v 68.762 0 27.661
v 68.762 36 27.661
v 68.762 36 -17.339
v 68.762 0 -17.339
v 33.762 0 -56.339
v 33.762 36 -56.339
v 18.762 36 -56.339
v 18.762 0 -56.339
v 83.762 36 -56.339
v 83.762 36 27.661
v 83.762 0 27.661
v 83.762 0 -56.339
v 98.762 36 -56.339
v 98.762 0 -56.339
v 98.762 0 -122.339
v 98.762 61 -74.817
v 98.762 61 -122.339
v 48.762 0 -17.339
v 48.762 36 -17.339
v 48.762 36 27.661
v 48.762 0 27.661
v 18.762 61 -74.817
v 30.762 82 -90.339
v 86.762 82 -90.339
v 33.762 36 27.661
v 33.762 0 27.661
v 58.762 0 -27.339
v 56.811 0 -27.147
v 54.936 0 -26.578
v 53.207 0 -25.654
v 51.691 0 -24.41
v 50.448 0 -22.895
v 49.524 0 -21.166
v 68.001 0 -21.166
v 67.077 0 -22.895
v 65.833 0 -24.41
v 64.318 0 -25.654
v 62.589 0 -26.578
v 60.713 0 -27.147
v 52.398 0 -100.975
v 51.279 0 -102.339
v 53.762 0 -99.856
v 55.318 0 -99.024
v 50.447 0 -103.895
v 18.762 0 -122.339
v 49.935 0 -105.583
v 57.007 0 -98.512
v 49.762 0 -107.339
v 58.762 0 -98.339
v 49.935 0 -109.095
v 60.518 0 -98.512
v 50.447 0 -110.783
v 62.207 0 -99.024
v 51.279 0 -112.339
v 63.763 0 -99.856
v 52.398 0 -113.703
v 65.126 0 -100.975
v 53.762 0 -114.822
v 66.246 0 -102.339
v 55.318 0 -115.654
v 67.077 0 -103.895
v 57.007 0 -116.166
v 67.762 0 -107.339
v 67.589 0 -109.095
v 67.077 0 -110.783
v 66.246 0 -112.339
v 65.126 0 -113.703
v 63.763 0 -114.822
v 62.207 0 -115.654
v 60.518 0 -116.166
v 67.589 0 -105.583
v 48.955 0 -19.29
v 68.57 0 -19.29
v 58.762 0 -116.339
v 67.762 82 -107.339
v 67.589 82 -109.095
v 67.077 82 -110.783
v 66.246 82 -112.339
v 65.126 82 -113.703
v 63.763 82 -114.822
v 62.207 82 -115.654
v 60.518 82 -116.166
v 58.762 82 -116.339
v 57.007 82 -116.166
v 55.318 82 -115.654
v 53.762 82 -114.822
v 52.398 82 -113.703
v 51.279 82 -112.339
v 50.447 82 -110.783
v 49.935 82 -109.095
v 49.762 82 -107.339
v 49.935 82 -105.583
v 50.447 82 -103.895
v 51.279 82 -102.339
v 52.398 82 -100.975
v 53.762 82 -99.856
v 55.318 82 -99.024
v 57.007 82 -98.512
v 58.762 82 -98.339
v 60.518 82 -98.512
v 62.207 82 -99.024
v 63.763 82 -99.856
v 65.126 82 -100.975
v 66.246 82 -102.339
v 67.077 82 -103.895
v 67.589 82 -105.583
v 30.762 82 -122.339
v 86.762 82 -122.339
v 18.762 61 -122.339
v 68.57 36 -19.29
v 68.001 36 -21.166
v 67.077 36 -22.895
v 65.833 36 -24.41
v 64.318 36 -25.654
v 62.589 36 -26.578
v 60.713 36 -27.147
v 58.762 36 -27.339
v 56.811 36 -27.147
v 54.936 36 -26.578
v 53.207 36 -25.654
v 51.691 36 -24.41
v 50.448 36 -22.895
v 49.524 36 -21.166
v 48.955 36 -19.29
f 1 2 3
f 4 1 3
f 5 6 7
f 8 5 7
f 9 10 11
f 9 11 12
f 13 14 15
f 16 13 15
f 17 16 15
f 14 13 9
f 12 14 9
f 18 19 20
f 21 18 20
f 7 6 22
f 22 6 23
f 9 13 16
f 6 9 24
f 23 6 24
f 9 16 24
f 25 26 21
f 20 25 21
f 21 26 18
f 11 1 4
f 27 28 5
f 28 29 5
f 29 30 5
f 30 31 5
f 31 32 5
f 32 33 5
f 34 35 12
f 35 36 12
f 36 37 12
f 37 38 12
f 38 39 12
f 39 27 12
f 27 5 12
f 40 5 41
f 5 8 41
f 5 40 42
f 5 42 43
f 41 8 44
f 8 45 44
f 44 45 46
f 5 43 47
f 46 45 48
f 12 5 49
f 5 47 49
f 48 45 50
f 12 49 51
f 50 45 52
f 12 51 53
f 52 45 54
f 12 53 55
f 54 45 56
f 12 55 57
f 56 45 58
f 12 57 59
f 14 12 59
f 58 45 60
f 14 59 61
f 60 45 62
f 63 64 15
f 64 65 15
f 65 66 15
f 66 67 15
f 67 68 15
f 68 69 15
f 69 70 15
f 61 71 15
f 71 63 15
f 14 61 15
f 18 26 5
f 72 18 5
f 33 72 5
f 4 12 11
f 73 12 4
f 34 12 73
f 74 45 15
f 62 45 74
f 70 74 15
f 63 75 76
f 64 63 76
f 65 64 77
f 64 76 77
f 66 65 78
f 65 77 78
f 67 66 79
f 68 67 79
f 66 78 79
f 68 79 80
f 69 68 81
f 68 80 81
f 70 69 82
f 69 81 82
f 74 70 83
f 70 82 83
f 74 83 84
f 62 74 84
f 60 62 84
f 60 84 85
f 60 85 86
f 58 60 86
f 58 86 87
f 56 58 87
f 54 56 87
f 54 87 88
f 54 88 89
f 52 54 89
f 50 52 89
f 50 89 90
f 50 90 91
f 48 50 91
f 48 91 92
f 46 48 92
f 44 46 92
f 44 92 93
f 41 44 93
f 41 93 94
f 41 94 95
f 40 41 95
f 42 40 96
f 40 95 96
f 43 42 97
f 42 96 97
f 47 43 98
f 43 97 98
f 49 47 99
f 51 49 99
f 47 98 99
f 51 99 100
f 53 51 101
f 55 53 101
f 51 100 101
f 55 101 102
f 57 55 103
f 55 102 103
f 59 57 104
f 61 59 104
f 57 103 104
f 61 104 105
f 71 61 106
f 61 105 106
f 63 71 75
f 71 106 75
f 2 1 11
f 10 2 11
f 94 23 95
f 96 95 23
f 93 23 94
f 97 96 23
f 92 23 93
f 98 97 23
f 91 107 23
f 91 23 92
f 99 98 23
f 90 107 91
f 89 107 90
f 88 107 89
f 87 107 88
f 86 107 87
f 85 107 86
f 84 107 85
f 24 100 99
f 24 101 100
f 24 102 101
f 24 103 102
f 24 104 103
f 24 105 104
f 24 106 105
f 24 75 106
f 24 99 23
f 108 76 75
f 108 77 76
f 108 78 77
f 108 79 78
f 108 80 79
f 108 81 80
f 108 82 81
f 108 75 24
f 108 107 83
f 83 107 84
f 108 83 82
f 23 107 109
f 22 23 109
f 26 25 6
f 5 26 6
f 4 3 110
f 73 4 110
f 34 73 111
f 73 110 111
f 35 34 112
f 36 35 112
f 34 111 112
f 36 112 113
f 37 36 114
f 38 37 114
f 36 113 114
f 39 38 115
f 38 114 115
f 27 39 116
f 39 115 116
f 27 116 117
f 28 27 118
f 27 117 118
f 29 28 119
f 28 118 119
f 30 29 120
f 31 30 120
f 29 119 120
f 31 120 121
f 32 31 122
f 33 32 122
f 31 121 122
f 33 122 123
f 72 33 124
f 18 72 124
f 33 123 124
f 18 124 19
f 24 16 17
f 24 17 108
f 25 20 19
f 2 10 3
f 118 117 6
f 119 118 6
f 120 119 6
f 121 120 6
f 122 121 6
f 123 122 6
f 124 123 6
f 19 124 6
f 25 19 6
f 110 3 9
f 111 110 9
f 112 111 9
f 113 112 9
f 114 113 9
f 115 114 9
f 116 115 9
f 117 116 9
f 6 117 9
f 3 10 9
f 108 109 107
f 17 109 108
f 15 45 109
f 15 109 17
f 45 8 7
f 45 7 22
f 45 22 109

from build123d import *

# Parameters (mm, degrees)
CROQUIS1_W              = 80
CROQUIS1_H              = 150
SALIENTE_EXTRUIR1_DEPTH = 82
CORTAR_EXTRUIR1_DEPTH   = 150
CROQUIS3_R              = 9
CROQUIS3_W              = 12
CROQUIS3_H              = 84
CROQUIS3_W_2            = 3
CORTAR_EXTRUIR2_DEPTH   = 150
CORTAR_EXTRUIR3_DEPTH   = 80


with BuildPart() as part:
    # Croquis1 → Saliente-Extruir1 (new body)
    with BuildSketch(Plane(origin=(0, 0, 0), x_dir=(1, 0, 0), z_dir=(0, 1, 0))):
        with Locations((58.762376238, 47.339108911)):
            Rectangle(CROQUIS1_W, CROQUIS1_H)
    extrude(amount=SALIENTE_EXTRUIR1_DEPTH)

    # Croquis2 → Cortar-Extruir1 (cut)
    with BuildSketch(Plane(origin=(0, 0, -122.339108911), x_dir=(-1, 0, 0), z_dir=(0, 0, -1))):
        Polygon((-98.762376238, 82), (-98.762376238, 61), (-86.762376238, 82), align=None)
        Polygon((-18.762376238, 82), (-30.762376238, 82), (-18.762376238, 61), align=None)
    extrude(amount=-CORTAR_EXTRUIR1_DEPTH, mode=Mode.SUBTRACT)

    # Croquis3 → Cortar-Extruir2 (cut)
    with BuildSketch(Plane(origin=(0, 82, 0), x_dir=(1, 0, 0), z_dir=(0, 1, 0))):
        with Locations((58.762376238, 107.339108911)):
            Circle(CROQUIS3_R)
        with BuildLine():
            ThreePointArc((68.762376238, 17.339108911), (58.762376238, 27.339108911), (48.762376238, 17.339108911))
            Line((48.762376238, 17.339108911), (48.762376238, -27.660891089))
            Line((48.762376238, -27.660891089), (68.762376238, -27.660891089))
            Line((68.762376238, -27.660891089), (68.762376238, 17.339108911))
        make_face()
        with Locations((24.762376238, 14.339108911)):
            Rectangle(CROQUIS3_W, CROQUIS3_H)
        with Locations((32.262376238, 14.339108911)):
            Rectangle(CROQUIS3_W_2, CROQUIS3_H)
        with Locations((92.762376238, 14.339108911)):
            Rectangle(CROQUIS3_W, CROQUIS3_H)
        with Locations((85.262376238, 14.339108911)):
            Rectangle(CROQUIS3_W_2, CROQUIS3_H)
    extrude(amount=-CORTAR_EXTRUIR2_DEPTH, mode=Mode.SUBTRACT)

    # Croquis4 → Cortar-Extruir3 (cut)
    with BuildSketch(Plane(origin=(98.762376238, 0, 0), x_dir=(0, 0, -1), z_dir=(1, 0, 0))):
        Polygon((-27.660891089, 36), (56.339108911, 36), (90.339108911, 82), (-27.660891089, 82), align=None)
    extrude(amount=-CORTAR_EXTRUIR3_DEPTH, mode=Mode.SUBTRACT)


solid = part.part
